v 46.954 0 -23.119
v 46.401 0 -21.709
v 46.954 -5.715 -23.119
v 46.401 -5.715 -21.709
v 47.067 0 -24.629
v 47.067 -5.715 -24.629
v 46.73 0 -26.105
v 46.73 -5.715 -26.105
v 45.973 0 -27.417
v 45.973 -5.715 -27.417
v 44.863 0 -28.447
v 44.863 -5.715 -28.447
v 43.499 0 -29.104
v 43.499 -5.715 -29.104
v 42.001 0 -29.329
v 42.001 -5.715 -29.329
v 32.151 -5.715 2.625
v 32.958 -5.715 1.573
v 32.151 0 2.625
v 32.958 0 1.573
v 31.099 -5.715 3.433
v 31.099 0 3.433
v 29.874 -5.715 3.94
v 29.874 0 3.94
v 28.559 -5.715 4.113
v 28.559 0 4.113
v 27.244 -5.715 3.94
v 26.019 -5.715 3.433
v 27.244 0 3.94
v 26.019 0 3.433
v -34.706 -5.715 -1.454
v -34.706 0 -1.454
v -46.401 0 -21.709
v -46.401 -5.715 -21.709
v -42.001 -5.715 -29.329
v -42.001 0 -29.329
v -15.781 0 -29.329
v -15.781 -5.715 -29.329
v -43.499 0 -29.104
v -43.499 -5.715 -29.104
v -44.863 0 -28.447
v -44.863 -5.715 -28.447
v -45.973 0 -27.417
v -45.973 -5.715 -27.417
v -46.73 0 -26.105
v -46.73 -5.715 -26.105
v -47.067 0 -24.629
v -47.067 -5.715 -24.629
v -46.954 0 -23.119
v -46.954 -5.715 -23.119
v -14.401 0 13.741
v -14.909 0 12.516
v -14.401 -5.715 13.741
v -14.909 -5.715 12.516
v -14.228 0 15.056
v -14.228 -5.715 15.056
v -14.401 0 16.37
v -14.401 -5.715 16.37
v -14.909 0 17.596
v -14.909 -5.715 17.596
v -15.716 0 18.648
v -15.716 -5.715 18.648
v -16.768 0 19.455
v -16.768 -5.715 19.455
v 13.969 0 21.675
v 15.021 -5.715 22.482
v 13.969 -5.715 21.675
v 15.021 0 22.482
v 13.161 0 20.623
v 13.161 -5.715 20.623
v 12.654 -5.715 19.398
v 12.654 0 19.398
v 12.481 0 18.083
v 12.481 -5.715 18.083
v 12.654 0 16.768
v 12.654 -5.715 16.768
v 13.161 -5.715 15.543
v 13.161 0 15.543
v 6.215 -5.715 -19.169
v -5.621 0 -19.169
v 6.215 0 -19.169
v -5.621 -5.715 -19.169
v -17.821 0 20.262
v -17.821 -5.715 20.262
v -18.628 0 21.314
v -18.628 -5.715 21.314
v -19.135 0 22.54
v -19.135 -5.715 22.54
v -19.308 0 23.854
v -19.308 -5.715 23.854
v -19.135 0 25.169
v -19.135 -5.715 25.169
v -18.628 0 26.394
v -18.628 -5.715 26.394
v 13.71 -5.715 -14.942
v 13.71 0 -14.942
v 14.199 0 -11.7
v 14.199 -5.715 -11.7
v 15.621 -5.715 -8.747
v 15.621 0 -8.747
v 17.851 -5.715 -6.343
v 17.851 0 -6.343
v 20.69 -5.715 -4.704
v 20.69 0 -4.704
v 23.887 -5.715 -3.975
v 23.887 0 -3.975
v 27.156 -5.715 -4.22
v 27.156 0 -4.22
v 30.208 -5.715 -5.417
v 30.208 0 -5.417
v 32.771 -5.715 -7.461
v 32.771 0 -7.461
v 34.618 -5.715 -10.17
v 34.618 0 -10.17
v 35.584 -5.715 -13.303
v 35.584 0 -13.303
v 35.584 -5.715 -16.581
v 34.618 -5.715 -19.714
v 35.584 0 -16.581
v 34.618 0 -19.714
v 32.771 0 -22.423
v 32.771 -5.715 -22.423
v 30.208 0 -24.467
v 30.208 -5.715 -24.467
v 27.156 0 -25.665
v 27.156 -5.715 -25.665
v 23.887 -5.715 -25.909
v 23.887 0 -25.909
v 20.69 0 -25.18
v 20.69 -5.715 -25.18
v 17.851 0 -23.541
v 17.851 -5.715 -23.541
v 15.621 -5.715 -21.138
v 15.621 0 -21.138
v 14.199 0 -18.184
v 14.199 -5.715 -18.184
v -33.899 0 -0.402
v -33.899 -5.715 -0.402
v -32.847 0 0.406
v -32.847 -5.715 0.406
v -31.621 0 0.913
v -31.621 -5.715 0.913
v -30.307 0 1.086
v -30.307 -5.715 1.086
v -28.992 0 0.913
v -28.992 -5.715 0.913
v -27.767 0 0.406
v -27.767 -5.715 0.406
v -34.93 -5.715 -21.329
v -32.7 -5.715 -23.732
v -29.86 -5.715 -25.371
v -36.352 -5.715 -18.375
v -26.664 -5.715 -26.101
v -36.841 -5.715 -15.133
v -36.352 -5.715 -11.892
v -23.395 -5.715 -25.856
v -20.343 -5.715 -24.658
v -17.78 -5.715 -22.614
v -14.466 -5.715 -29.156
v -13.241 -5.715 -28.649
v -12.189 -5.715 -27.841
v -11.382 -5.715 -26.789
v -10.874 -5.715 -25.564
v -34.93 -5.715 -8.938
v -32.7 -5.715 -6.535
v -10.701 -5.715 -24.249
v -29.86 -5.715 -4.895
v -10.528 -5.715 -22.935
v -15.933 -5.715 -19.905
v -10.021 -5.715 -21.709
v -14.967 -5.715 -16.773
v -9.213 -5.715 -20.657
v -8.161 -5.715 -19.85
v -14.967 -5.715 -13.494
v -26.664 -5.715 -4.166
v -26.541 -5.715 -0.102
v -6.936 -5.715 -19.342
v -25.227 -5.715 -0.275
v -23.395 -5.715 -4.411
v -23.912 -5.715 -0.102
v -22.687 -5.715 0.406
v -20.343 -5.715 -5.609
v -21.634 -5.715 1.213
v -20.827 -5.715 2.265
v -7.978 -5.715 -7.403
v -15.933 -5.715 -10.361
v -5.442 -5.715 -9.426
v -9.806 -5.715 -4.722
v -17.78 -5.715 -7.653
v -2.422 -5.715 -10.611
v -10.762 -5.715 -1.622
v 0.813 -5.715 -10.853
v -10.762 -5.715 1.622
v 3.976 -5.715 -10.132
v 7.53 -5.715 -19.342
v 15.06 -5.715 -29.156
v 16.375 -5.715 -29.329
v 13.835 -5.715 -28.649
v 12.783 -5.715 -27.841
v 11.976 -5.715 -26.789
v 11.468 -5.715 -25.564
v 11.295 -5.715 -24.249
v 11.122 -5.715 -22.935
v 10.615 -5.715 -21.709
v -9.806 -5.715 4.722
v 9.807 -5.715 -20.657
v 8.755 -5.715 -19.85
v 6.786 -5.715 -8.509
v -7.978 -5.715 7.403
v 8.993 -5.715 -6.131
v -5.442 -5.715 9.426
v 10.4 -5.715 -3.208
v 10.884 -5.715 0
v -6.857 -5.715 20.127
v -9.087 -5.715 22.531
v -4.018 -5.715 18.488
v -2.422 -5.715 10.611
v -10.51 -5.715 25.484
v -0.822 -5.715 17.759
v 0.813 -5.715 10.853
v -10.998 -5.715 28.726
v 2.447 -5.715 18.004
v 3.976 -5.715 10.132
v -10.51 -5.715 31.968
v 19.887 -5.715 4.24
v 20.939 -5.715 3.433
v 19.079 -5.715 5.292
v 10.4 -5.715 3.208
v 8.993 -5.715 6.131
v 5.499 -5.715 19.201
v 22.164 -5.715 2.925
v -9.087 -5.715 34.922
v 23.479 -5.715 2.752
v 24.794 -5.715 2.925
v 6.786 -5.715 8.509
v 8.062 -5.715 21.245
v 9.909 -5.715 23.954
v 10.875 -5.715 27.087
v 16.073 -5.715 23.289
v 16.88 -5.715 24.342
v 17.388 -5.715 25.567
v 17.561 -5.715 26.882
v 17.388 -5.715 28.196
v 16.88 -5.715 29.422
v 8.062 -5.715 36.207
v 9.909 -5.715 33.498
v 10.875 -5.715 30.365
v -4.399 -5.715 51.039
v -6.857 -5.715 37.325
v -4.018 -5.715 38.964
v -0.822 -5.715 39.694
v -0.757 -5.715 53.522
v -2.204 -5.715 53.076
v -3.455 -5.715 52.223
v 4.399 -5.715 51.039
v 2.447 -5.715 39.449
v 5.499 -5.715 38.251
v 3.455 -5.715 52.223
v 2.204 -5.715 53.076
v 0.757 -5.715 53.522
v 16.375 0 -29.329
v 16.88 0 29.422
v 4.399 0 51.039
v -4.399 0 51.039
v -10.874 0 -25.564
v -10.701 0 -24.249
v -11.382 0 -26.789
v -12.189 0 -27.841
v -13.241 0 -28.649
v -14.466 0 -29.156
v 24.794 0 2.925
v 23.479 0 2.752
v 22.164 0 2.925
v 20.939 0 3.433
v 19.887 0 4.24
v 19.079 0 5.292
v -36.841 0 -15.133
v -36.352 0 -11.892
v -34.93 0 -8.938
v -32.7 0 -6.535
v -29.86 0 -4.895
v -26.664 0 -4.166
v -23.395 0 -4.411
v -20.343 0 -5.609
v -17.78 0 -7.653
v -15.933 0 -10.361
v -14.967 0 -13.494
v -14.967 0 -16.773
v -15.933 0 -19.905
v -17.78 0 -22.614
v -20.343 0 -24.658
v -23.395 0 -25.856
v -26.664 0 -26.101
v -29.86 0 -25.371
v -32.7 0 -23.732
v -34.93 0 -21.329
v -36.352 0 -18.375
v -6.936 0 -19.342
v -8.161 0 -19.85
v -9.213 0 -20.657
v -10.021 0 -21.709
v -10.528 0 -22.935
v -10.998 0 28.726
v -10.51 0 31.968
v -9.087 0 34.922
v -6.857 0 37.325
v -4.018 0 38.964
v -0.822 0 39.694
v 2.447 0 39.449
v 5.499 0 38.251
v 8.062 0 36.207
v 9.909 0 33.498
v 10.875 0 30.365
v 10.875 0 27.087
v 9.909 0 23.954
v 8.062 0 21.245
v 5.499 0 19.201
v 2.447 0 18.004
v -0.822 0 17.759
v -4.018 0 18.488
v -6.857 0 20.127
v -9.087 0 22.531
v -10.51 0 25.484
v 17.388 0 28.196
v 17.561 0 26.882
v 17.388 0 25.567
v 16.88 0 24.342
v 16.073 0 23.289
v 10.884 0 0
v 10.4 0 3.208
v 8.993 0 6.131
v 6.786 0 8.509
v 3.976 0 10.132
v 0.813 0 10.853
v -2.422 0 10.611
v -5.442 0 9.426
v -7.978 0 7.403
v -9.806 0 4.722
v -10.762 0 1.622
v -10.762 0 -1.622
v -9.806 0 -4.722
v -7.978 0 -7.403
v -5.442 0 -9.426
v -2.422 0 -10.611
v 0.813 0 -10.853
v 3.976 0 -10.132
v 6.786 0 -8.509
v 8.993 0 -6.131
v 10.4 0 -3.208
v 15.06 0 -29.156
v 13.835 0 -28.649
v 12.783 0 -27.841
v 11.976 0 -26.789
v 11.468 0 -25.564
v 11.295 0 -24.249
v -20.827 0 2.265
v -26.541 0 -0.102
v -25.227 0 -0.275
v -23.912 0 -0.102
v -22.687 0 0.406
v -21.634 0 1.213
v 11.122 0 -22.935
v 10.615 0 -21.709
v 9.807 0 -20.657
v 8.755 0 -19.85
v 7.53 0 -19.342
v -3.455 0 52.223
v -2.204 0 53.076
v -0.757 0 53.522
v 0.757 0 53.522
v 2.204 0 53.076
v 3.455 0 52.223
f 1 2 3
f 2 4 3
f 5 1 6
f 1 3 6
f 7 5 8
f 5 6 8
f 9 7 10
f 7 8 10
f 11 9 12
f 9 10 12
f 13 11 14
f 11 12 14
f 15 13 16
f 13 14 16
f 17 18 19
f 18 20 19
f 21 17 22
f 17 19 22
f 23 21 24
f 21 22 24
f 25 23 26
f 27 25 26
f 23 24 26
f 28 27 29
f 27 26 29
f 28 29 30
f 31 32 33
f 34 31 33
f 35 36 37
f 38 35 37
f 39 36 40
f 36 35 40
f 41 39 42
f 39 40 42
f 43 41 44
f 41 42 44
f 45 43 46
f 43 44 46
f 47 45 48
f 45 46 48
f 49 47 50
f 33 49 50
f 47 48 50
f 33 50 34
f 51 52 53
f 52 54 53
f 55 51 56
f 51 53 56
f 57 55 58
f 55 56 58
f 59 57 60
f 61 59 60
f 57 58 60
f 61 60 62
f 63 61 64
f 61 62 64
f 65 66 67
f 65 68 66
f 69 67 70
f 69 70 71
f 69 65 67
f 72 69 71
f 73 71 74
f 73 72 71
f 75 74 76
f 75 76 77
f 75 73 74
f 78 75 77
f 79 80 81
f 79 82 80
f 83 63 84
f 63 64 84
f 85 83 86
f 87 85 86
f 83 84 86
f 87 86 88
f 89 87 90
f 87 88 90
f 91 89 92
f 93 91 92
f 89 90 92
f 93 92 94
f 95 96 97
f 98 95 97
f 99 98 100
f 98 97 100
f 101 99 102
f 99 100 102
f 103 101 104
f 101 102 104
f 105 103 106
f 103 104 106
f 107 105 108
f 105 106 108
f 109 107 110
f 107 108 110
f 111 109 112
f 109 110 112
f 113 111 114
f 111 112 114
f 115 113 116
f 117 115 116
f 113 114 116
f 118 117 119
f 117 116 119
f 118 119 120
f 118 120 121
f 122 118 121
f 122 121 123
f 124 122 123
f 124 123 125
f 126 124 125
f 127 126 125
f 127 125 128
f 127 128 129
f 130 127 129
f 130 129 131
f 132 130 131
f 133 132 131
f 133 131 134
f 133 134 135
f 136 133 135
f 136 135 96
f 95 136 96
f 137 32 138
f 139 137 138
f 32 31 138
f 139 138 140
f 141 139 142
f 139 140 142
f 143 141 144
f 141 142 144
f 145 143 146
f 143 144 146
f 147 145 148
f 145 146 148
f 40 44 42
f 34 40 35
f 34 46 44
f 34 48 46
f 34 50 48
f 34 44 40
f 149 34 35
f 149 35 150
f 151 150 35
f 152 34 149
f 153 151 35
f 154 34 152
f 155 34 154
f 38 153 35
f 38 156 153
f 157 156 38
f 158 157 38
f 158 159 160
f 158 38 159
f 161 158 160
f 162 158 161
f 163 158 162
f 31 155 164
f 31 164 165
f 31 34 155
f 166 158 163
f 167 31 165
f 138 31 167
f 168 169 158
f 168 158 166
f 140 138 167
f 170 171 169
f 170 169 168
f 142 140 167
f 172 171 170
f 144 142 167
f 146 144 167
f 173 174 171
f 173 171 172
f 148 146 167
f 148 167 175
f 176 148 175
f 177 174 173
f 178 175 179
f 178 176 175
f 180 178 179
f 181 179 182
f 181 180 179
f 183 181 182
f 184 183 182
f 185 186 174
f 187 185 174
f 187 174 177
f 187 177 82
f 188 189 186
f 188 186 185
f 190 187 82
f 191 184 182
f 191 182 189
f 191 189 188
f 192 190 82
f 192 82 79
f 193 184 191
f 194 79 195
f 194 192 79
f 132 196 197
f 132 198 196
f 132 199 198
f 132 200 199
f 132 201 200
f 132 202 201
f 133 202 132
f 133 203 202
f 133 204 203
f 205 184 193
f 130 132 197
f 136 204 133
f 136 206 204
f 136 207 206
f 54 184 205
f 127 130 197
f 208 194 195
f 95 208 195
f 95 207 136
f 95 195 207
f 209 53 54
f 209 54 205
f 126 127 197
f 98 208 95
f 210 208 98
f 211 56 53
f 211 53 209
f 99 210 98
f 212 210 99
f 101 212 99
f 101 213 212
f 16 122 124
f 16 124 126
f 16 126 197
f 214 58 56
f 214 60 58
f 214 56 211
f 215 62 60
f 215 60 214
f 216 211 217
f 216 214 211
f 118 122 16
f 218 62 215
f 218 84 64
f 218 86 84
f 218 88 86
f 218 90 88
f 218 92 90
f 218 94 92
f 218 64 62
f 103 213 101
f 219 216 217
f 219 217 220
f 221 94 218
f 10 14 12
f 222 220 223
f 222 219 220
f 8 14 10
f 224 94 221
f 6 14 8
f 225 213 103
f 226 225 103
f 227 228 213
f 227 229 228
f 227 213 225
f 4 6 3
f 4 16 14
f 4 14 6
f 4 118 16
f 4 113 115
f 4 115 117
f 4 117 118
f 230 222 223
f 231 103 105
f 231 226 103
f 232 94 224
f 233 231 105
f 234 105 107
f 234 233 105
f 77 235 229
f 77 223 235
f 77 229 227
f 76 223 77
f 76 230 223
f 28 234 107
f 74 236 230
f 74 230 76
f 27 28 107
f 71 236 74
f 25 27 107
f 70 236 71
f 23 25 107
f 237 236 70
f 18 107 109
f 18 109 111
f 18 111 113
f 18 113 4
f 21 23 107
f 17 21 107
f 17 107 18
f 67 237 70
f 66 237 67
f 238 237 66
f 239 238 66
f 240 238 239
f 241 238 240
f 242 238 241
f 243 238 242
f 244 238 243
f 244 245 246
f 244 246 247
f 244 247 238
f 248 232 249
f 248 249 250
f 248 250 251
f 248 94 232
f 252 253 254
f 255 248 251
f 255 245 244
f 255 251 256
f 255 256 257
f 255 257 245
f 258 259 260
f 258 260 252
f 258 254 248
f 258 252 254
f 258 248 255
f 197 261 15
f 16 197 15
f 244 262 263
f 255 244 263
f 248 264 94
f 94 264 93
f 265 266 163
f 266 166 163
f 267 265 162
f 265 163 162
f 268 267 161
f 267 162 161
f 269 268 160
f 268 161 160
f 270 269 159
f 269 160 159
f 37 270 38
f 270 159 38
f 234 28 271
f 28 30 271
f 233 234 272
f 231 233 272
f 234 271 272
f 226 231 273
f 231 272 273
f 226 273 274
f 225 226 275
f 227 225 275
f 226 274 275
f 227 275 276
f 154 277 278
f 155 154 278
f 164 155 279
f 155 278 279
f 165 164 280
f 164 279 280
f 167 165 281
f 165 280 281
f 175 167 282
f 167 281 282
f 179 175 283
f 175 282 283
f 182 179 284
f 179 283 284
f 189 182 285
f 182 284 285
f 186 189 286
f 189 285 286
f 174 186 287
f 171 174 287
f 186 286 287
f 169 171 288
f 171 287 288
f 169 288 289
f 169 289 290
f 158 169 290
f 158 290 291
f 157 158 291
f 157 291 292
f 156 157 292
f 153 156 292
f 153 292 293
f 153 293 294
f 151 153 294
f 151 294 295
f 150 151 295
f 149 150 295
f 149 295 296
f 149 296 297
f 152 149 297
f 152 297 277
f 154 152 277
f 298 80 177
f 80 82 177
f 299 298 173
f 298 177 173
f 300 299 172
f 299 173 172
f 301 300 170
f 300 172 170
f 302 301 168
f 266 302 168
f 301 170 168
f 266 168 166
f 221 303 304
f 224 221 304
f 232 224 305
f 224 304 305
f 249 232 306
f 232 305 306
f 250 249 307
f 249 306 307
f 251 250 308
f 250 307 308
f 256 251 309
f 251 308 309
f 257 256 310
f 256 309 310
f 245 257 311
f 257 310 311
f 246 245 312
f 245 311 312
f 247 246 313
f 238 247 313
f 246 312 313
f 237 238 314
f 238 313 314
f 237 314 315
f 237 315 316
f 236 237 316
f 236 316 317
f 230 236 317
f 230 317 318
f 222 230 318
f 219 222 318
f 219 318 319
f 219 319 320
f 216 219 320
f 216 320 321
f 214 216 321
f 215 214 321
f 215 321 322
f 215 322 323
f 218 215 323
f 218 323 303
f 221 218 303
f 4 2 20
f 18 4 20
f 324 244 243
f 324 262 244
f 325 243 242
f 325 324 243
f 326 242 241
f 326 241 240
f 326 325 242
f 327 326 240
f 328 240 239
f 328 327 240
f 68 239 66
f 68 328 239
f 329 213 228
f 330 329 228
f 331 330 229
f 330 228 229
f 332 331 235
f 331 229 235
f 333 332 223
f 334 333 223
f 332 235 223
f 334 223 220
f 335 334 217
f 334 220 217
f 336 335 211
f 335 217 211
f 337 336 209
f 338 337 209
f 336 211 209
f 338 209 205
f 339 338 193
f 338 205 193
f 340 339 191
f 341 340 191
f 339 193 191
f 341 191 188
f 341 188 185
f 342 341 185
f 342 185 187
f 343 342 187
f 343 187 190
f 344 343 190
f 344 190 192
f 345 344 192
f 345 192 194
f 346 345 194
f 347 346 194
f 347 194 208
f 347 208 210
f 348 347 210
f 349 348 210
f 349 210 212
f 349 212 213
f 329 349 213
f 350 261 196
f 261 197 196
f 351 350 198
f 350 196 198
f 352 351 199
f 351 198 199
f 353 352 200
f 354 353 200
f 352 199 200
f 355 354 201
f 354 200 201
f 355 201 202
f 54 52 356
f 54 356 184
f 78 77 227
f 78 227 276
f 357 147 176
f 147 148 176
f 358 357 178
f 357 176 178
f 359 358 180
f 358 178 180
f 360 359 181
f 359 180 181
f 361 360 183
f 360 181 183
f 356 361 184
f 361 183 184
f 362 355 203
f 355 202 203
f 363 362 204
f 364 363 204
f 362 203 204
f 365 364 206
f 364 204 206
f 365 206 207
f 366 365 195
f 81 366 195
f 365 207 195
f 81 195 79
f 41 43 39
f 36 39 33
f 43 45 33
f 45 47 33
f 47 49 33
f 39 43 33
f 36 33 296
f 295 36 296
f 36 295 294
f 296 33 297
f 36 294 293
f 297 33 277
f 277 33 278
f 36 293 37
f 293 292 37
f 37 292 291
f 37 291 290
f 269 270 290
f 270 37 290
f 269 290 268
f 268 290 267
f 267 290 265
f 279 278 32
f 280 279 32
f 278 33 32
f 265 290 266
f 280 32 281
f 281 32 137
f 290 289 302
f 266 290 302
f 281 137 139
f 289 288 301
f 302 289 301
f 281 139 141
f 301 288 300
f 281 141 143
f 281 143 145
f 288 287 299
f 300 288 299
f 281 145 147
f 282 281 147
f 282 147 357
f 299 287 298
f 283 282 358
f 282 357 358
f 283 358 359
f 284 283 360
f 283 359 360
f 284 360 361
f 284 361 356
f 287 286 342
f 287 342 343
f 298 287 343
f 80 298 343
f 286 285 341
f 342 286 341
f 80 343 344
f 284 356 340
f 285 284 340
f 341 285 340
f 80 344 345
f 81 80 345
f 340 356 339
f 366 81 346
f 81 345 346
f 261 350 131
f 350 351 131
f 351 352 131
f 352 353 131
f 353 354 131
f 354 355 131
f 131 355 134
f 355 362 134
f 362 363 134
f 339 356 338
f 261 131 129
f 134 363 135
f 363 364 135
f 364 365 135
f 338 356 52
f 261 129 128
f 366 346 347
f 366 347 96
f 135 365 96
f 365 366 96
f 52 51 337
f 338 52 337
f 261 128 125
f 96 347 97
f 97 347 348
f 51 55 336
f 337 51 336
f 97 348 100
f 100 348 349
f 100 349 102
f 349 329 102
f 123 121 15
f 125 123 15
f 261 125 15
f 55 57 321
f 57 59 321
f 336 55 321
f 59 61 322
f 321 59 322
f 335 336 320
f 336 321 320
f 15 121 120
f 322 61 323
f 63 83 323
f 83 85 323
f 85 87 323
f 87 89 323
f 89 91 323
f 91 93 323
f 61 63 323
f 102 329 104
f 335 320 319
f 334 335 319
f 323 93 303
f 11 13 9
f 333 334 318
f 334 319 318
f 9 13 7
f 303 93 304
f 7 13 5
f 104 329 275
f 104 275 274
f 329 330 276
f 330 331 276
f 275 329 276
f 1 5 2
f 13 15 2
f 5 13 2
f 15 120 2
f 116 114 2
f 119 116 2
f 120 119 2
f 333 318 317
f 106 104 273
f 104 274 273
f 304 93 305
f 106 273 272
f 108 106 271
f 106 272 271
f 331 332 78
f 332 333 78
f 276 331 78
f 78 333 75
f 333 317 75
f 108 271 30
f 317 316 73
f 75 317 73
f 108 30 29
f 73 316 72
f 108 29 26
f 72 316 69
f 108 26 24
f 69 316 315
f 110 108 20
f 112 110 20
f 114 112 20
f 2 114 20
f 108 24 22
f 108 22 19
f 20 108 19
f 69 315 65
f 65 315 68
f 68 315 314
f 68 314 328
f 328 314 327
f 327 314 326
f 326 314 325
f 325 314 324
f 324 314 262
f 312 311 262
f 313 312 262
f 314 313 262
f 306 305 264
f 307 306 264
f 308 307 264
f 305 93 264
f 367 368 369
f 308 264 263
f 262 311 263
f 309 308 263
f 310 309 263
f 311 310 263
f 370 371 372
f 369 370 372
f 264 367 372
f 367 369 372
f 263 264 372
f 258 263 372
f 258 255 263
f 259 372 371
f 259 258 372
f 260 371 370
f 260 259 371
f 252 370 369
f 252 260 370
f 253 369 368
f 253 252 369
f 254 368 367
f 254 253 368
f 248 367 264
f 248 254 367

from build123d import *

# Parameters (mm, degrees)
F1_DEPTH  = 5.715
F2_R      = 10.8839
F3_DEPTH  = 25.4
F4_W      = 5.715
F4_H      = 21.9964
F5_DEPTH  = 10.16
F6_R      = 5.07999
F7_R      = 5.08
F8_W      = 5.715
F8_H      = 21.9964
F9_DEPTH  = 10.16
F10_R     = 5.07999
F11_W     = 21.9964
F11_H     = 5.715
F12_DEPTH = 10.16
F13_R     = 5.07999
F14_R     = 10.9982
F15_DEPTH = 25.4


# Not quite as in the source:
# - a fillet or chamfer is up to 0.001 mm smaller than in the source, because OpenCascade refuses the exact size


with BuildPart() as f1:
    # F0 (on Front) → F1 (new body)
    with BuildSketch(Plane.XZ):
        Polygon((-50.8, -29.3293936748), (50.8, -29.3293936748), (0, 58.6587873497), align=None)
    extrude(amount=F1_DEPTH)

    # F2 (on face) → F3 (cut)
    with BuildSketch(Plane.XZ.offset(5.715)):
        Circle(F2_R)
    extrude(amount=-F3_DEPTH, mode=Mode.SUBTRACT)

    # F4 (on face) → F5 (cut)
    with BuildSketch(Plane(origin=(25.4, 0, 14.6646968374), x_dir=(0, 1, 0), z_dir=(0.8660254038, 0, 0.5))):
        with Locations((-2.8575, 0.9615815512)):
            Rectangle(F4_W, F4_H)
    extrude(amount=-F5_DEPTH, mode=Mode.SUBTRACT)

    # F6 (radius 5.08 in the source; OpenCascade refuses exactly that, so slightly less here)
    f6_edges = [f1.edges().sort_by_distance(p)[0] for p in [
        (21.619491, -2.8575, 0.89273),
        (10.621291, -2.8575, 19.942171),
        (30.418309, -2.8575, 5.97273),
        (19.420109, -2.8575, 25.022171),
    ]]
    fillet(f6_edges, radius=F6_R)

    # F7
    f7_edges = [f1.edges().sort_by_distance(p)[0] for p in [
        (50.8, -2.8575, -29.329394),
        (-50.8, -2.8575, -29.329394),
        (0, -2.8575, 58.658787),
    ]]
    fillet(f7_edges, radius=F7_R)

    # F8 (on face) → F9 (cut)
    with BuildSketch(Plane(origin=(-25.4, 0, 14.6646968374), x_dir=(0, -1, 0), z_dir=(-0.8660254038, 0, 0.5))):
        with Locations((2.8575, -2.5338024565)):
            Rectangle(F8_W, F8_H)
    extrude(amount=-F9_DEPTH, mode=Mode.SUBTRACT)

    # F10 (radius 5.08 in the source; OpenCascade refuses exactly that, so slightly less here)
    f10_edges = [f1.edges().sort_by_distance(p)[0] for p in [
        (-21.167801, -2.8575, 21.99508),
        (-12.368983, -2.8575, 16.91508),
        (-32.166001, -2.8575, 2.945639),
        (-23.367183, -2.8575, -2.134361),
    ]]
    fillet(f10_edges, radius=F10_R)

    # F11 (on face) → F12 (cut)
    with BuildSketch(Plane(origin=(0, 0, -29.3293936748), x_dir=(1, 0, 0), z_dir=(0, 0, -1))):
        with Locations((0.2968947671, 2.8575)):
            Rectangle(F11_W, F11_H)
    extrude(amount=-F12_DEPTH, mode=Mode.SUBTRACT)

    # F13 (radius 5.08 in the source; OpenCascade refuses exactly that, so slightly less here)
    f13_edges = [f1.edges().sort_by_distance(p)[0] for p in [
        (11.295095, -2.8575, -29.329394),
        (11.295095, -2.8575, -19.169394),
        (-10.701305, -2.8575, -29.329394),
        (-10.701305, -2.8575, -19.169394),
    ]]
    fillet(f13_edges, radius=F13_R)

    # F14 (on face) → F15 (cut)
    with BuildSketch(Plane(origin=(0, 0, 0), x_dir=(-1, 0, 0), z_dir=(0, 1, 0))):
        with Locations((0, 28.7260549402)):
            Circle(F14_R)
        with Locations((25.8424041398, -15.1333886554)):
            Circle(F14_R)
        with Locations((-24.7085423876, -14.9420522576)):
            Circle(F14_R)
    extrude(amount=-F15_DEPTH, mode=Mode.SUBTRACT)


solid = f1.part
